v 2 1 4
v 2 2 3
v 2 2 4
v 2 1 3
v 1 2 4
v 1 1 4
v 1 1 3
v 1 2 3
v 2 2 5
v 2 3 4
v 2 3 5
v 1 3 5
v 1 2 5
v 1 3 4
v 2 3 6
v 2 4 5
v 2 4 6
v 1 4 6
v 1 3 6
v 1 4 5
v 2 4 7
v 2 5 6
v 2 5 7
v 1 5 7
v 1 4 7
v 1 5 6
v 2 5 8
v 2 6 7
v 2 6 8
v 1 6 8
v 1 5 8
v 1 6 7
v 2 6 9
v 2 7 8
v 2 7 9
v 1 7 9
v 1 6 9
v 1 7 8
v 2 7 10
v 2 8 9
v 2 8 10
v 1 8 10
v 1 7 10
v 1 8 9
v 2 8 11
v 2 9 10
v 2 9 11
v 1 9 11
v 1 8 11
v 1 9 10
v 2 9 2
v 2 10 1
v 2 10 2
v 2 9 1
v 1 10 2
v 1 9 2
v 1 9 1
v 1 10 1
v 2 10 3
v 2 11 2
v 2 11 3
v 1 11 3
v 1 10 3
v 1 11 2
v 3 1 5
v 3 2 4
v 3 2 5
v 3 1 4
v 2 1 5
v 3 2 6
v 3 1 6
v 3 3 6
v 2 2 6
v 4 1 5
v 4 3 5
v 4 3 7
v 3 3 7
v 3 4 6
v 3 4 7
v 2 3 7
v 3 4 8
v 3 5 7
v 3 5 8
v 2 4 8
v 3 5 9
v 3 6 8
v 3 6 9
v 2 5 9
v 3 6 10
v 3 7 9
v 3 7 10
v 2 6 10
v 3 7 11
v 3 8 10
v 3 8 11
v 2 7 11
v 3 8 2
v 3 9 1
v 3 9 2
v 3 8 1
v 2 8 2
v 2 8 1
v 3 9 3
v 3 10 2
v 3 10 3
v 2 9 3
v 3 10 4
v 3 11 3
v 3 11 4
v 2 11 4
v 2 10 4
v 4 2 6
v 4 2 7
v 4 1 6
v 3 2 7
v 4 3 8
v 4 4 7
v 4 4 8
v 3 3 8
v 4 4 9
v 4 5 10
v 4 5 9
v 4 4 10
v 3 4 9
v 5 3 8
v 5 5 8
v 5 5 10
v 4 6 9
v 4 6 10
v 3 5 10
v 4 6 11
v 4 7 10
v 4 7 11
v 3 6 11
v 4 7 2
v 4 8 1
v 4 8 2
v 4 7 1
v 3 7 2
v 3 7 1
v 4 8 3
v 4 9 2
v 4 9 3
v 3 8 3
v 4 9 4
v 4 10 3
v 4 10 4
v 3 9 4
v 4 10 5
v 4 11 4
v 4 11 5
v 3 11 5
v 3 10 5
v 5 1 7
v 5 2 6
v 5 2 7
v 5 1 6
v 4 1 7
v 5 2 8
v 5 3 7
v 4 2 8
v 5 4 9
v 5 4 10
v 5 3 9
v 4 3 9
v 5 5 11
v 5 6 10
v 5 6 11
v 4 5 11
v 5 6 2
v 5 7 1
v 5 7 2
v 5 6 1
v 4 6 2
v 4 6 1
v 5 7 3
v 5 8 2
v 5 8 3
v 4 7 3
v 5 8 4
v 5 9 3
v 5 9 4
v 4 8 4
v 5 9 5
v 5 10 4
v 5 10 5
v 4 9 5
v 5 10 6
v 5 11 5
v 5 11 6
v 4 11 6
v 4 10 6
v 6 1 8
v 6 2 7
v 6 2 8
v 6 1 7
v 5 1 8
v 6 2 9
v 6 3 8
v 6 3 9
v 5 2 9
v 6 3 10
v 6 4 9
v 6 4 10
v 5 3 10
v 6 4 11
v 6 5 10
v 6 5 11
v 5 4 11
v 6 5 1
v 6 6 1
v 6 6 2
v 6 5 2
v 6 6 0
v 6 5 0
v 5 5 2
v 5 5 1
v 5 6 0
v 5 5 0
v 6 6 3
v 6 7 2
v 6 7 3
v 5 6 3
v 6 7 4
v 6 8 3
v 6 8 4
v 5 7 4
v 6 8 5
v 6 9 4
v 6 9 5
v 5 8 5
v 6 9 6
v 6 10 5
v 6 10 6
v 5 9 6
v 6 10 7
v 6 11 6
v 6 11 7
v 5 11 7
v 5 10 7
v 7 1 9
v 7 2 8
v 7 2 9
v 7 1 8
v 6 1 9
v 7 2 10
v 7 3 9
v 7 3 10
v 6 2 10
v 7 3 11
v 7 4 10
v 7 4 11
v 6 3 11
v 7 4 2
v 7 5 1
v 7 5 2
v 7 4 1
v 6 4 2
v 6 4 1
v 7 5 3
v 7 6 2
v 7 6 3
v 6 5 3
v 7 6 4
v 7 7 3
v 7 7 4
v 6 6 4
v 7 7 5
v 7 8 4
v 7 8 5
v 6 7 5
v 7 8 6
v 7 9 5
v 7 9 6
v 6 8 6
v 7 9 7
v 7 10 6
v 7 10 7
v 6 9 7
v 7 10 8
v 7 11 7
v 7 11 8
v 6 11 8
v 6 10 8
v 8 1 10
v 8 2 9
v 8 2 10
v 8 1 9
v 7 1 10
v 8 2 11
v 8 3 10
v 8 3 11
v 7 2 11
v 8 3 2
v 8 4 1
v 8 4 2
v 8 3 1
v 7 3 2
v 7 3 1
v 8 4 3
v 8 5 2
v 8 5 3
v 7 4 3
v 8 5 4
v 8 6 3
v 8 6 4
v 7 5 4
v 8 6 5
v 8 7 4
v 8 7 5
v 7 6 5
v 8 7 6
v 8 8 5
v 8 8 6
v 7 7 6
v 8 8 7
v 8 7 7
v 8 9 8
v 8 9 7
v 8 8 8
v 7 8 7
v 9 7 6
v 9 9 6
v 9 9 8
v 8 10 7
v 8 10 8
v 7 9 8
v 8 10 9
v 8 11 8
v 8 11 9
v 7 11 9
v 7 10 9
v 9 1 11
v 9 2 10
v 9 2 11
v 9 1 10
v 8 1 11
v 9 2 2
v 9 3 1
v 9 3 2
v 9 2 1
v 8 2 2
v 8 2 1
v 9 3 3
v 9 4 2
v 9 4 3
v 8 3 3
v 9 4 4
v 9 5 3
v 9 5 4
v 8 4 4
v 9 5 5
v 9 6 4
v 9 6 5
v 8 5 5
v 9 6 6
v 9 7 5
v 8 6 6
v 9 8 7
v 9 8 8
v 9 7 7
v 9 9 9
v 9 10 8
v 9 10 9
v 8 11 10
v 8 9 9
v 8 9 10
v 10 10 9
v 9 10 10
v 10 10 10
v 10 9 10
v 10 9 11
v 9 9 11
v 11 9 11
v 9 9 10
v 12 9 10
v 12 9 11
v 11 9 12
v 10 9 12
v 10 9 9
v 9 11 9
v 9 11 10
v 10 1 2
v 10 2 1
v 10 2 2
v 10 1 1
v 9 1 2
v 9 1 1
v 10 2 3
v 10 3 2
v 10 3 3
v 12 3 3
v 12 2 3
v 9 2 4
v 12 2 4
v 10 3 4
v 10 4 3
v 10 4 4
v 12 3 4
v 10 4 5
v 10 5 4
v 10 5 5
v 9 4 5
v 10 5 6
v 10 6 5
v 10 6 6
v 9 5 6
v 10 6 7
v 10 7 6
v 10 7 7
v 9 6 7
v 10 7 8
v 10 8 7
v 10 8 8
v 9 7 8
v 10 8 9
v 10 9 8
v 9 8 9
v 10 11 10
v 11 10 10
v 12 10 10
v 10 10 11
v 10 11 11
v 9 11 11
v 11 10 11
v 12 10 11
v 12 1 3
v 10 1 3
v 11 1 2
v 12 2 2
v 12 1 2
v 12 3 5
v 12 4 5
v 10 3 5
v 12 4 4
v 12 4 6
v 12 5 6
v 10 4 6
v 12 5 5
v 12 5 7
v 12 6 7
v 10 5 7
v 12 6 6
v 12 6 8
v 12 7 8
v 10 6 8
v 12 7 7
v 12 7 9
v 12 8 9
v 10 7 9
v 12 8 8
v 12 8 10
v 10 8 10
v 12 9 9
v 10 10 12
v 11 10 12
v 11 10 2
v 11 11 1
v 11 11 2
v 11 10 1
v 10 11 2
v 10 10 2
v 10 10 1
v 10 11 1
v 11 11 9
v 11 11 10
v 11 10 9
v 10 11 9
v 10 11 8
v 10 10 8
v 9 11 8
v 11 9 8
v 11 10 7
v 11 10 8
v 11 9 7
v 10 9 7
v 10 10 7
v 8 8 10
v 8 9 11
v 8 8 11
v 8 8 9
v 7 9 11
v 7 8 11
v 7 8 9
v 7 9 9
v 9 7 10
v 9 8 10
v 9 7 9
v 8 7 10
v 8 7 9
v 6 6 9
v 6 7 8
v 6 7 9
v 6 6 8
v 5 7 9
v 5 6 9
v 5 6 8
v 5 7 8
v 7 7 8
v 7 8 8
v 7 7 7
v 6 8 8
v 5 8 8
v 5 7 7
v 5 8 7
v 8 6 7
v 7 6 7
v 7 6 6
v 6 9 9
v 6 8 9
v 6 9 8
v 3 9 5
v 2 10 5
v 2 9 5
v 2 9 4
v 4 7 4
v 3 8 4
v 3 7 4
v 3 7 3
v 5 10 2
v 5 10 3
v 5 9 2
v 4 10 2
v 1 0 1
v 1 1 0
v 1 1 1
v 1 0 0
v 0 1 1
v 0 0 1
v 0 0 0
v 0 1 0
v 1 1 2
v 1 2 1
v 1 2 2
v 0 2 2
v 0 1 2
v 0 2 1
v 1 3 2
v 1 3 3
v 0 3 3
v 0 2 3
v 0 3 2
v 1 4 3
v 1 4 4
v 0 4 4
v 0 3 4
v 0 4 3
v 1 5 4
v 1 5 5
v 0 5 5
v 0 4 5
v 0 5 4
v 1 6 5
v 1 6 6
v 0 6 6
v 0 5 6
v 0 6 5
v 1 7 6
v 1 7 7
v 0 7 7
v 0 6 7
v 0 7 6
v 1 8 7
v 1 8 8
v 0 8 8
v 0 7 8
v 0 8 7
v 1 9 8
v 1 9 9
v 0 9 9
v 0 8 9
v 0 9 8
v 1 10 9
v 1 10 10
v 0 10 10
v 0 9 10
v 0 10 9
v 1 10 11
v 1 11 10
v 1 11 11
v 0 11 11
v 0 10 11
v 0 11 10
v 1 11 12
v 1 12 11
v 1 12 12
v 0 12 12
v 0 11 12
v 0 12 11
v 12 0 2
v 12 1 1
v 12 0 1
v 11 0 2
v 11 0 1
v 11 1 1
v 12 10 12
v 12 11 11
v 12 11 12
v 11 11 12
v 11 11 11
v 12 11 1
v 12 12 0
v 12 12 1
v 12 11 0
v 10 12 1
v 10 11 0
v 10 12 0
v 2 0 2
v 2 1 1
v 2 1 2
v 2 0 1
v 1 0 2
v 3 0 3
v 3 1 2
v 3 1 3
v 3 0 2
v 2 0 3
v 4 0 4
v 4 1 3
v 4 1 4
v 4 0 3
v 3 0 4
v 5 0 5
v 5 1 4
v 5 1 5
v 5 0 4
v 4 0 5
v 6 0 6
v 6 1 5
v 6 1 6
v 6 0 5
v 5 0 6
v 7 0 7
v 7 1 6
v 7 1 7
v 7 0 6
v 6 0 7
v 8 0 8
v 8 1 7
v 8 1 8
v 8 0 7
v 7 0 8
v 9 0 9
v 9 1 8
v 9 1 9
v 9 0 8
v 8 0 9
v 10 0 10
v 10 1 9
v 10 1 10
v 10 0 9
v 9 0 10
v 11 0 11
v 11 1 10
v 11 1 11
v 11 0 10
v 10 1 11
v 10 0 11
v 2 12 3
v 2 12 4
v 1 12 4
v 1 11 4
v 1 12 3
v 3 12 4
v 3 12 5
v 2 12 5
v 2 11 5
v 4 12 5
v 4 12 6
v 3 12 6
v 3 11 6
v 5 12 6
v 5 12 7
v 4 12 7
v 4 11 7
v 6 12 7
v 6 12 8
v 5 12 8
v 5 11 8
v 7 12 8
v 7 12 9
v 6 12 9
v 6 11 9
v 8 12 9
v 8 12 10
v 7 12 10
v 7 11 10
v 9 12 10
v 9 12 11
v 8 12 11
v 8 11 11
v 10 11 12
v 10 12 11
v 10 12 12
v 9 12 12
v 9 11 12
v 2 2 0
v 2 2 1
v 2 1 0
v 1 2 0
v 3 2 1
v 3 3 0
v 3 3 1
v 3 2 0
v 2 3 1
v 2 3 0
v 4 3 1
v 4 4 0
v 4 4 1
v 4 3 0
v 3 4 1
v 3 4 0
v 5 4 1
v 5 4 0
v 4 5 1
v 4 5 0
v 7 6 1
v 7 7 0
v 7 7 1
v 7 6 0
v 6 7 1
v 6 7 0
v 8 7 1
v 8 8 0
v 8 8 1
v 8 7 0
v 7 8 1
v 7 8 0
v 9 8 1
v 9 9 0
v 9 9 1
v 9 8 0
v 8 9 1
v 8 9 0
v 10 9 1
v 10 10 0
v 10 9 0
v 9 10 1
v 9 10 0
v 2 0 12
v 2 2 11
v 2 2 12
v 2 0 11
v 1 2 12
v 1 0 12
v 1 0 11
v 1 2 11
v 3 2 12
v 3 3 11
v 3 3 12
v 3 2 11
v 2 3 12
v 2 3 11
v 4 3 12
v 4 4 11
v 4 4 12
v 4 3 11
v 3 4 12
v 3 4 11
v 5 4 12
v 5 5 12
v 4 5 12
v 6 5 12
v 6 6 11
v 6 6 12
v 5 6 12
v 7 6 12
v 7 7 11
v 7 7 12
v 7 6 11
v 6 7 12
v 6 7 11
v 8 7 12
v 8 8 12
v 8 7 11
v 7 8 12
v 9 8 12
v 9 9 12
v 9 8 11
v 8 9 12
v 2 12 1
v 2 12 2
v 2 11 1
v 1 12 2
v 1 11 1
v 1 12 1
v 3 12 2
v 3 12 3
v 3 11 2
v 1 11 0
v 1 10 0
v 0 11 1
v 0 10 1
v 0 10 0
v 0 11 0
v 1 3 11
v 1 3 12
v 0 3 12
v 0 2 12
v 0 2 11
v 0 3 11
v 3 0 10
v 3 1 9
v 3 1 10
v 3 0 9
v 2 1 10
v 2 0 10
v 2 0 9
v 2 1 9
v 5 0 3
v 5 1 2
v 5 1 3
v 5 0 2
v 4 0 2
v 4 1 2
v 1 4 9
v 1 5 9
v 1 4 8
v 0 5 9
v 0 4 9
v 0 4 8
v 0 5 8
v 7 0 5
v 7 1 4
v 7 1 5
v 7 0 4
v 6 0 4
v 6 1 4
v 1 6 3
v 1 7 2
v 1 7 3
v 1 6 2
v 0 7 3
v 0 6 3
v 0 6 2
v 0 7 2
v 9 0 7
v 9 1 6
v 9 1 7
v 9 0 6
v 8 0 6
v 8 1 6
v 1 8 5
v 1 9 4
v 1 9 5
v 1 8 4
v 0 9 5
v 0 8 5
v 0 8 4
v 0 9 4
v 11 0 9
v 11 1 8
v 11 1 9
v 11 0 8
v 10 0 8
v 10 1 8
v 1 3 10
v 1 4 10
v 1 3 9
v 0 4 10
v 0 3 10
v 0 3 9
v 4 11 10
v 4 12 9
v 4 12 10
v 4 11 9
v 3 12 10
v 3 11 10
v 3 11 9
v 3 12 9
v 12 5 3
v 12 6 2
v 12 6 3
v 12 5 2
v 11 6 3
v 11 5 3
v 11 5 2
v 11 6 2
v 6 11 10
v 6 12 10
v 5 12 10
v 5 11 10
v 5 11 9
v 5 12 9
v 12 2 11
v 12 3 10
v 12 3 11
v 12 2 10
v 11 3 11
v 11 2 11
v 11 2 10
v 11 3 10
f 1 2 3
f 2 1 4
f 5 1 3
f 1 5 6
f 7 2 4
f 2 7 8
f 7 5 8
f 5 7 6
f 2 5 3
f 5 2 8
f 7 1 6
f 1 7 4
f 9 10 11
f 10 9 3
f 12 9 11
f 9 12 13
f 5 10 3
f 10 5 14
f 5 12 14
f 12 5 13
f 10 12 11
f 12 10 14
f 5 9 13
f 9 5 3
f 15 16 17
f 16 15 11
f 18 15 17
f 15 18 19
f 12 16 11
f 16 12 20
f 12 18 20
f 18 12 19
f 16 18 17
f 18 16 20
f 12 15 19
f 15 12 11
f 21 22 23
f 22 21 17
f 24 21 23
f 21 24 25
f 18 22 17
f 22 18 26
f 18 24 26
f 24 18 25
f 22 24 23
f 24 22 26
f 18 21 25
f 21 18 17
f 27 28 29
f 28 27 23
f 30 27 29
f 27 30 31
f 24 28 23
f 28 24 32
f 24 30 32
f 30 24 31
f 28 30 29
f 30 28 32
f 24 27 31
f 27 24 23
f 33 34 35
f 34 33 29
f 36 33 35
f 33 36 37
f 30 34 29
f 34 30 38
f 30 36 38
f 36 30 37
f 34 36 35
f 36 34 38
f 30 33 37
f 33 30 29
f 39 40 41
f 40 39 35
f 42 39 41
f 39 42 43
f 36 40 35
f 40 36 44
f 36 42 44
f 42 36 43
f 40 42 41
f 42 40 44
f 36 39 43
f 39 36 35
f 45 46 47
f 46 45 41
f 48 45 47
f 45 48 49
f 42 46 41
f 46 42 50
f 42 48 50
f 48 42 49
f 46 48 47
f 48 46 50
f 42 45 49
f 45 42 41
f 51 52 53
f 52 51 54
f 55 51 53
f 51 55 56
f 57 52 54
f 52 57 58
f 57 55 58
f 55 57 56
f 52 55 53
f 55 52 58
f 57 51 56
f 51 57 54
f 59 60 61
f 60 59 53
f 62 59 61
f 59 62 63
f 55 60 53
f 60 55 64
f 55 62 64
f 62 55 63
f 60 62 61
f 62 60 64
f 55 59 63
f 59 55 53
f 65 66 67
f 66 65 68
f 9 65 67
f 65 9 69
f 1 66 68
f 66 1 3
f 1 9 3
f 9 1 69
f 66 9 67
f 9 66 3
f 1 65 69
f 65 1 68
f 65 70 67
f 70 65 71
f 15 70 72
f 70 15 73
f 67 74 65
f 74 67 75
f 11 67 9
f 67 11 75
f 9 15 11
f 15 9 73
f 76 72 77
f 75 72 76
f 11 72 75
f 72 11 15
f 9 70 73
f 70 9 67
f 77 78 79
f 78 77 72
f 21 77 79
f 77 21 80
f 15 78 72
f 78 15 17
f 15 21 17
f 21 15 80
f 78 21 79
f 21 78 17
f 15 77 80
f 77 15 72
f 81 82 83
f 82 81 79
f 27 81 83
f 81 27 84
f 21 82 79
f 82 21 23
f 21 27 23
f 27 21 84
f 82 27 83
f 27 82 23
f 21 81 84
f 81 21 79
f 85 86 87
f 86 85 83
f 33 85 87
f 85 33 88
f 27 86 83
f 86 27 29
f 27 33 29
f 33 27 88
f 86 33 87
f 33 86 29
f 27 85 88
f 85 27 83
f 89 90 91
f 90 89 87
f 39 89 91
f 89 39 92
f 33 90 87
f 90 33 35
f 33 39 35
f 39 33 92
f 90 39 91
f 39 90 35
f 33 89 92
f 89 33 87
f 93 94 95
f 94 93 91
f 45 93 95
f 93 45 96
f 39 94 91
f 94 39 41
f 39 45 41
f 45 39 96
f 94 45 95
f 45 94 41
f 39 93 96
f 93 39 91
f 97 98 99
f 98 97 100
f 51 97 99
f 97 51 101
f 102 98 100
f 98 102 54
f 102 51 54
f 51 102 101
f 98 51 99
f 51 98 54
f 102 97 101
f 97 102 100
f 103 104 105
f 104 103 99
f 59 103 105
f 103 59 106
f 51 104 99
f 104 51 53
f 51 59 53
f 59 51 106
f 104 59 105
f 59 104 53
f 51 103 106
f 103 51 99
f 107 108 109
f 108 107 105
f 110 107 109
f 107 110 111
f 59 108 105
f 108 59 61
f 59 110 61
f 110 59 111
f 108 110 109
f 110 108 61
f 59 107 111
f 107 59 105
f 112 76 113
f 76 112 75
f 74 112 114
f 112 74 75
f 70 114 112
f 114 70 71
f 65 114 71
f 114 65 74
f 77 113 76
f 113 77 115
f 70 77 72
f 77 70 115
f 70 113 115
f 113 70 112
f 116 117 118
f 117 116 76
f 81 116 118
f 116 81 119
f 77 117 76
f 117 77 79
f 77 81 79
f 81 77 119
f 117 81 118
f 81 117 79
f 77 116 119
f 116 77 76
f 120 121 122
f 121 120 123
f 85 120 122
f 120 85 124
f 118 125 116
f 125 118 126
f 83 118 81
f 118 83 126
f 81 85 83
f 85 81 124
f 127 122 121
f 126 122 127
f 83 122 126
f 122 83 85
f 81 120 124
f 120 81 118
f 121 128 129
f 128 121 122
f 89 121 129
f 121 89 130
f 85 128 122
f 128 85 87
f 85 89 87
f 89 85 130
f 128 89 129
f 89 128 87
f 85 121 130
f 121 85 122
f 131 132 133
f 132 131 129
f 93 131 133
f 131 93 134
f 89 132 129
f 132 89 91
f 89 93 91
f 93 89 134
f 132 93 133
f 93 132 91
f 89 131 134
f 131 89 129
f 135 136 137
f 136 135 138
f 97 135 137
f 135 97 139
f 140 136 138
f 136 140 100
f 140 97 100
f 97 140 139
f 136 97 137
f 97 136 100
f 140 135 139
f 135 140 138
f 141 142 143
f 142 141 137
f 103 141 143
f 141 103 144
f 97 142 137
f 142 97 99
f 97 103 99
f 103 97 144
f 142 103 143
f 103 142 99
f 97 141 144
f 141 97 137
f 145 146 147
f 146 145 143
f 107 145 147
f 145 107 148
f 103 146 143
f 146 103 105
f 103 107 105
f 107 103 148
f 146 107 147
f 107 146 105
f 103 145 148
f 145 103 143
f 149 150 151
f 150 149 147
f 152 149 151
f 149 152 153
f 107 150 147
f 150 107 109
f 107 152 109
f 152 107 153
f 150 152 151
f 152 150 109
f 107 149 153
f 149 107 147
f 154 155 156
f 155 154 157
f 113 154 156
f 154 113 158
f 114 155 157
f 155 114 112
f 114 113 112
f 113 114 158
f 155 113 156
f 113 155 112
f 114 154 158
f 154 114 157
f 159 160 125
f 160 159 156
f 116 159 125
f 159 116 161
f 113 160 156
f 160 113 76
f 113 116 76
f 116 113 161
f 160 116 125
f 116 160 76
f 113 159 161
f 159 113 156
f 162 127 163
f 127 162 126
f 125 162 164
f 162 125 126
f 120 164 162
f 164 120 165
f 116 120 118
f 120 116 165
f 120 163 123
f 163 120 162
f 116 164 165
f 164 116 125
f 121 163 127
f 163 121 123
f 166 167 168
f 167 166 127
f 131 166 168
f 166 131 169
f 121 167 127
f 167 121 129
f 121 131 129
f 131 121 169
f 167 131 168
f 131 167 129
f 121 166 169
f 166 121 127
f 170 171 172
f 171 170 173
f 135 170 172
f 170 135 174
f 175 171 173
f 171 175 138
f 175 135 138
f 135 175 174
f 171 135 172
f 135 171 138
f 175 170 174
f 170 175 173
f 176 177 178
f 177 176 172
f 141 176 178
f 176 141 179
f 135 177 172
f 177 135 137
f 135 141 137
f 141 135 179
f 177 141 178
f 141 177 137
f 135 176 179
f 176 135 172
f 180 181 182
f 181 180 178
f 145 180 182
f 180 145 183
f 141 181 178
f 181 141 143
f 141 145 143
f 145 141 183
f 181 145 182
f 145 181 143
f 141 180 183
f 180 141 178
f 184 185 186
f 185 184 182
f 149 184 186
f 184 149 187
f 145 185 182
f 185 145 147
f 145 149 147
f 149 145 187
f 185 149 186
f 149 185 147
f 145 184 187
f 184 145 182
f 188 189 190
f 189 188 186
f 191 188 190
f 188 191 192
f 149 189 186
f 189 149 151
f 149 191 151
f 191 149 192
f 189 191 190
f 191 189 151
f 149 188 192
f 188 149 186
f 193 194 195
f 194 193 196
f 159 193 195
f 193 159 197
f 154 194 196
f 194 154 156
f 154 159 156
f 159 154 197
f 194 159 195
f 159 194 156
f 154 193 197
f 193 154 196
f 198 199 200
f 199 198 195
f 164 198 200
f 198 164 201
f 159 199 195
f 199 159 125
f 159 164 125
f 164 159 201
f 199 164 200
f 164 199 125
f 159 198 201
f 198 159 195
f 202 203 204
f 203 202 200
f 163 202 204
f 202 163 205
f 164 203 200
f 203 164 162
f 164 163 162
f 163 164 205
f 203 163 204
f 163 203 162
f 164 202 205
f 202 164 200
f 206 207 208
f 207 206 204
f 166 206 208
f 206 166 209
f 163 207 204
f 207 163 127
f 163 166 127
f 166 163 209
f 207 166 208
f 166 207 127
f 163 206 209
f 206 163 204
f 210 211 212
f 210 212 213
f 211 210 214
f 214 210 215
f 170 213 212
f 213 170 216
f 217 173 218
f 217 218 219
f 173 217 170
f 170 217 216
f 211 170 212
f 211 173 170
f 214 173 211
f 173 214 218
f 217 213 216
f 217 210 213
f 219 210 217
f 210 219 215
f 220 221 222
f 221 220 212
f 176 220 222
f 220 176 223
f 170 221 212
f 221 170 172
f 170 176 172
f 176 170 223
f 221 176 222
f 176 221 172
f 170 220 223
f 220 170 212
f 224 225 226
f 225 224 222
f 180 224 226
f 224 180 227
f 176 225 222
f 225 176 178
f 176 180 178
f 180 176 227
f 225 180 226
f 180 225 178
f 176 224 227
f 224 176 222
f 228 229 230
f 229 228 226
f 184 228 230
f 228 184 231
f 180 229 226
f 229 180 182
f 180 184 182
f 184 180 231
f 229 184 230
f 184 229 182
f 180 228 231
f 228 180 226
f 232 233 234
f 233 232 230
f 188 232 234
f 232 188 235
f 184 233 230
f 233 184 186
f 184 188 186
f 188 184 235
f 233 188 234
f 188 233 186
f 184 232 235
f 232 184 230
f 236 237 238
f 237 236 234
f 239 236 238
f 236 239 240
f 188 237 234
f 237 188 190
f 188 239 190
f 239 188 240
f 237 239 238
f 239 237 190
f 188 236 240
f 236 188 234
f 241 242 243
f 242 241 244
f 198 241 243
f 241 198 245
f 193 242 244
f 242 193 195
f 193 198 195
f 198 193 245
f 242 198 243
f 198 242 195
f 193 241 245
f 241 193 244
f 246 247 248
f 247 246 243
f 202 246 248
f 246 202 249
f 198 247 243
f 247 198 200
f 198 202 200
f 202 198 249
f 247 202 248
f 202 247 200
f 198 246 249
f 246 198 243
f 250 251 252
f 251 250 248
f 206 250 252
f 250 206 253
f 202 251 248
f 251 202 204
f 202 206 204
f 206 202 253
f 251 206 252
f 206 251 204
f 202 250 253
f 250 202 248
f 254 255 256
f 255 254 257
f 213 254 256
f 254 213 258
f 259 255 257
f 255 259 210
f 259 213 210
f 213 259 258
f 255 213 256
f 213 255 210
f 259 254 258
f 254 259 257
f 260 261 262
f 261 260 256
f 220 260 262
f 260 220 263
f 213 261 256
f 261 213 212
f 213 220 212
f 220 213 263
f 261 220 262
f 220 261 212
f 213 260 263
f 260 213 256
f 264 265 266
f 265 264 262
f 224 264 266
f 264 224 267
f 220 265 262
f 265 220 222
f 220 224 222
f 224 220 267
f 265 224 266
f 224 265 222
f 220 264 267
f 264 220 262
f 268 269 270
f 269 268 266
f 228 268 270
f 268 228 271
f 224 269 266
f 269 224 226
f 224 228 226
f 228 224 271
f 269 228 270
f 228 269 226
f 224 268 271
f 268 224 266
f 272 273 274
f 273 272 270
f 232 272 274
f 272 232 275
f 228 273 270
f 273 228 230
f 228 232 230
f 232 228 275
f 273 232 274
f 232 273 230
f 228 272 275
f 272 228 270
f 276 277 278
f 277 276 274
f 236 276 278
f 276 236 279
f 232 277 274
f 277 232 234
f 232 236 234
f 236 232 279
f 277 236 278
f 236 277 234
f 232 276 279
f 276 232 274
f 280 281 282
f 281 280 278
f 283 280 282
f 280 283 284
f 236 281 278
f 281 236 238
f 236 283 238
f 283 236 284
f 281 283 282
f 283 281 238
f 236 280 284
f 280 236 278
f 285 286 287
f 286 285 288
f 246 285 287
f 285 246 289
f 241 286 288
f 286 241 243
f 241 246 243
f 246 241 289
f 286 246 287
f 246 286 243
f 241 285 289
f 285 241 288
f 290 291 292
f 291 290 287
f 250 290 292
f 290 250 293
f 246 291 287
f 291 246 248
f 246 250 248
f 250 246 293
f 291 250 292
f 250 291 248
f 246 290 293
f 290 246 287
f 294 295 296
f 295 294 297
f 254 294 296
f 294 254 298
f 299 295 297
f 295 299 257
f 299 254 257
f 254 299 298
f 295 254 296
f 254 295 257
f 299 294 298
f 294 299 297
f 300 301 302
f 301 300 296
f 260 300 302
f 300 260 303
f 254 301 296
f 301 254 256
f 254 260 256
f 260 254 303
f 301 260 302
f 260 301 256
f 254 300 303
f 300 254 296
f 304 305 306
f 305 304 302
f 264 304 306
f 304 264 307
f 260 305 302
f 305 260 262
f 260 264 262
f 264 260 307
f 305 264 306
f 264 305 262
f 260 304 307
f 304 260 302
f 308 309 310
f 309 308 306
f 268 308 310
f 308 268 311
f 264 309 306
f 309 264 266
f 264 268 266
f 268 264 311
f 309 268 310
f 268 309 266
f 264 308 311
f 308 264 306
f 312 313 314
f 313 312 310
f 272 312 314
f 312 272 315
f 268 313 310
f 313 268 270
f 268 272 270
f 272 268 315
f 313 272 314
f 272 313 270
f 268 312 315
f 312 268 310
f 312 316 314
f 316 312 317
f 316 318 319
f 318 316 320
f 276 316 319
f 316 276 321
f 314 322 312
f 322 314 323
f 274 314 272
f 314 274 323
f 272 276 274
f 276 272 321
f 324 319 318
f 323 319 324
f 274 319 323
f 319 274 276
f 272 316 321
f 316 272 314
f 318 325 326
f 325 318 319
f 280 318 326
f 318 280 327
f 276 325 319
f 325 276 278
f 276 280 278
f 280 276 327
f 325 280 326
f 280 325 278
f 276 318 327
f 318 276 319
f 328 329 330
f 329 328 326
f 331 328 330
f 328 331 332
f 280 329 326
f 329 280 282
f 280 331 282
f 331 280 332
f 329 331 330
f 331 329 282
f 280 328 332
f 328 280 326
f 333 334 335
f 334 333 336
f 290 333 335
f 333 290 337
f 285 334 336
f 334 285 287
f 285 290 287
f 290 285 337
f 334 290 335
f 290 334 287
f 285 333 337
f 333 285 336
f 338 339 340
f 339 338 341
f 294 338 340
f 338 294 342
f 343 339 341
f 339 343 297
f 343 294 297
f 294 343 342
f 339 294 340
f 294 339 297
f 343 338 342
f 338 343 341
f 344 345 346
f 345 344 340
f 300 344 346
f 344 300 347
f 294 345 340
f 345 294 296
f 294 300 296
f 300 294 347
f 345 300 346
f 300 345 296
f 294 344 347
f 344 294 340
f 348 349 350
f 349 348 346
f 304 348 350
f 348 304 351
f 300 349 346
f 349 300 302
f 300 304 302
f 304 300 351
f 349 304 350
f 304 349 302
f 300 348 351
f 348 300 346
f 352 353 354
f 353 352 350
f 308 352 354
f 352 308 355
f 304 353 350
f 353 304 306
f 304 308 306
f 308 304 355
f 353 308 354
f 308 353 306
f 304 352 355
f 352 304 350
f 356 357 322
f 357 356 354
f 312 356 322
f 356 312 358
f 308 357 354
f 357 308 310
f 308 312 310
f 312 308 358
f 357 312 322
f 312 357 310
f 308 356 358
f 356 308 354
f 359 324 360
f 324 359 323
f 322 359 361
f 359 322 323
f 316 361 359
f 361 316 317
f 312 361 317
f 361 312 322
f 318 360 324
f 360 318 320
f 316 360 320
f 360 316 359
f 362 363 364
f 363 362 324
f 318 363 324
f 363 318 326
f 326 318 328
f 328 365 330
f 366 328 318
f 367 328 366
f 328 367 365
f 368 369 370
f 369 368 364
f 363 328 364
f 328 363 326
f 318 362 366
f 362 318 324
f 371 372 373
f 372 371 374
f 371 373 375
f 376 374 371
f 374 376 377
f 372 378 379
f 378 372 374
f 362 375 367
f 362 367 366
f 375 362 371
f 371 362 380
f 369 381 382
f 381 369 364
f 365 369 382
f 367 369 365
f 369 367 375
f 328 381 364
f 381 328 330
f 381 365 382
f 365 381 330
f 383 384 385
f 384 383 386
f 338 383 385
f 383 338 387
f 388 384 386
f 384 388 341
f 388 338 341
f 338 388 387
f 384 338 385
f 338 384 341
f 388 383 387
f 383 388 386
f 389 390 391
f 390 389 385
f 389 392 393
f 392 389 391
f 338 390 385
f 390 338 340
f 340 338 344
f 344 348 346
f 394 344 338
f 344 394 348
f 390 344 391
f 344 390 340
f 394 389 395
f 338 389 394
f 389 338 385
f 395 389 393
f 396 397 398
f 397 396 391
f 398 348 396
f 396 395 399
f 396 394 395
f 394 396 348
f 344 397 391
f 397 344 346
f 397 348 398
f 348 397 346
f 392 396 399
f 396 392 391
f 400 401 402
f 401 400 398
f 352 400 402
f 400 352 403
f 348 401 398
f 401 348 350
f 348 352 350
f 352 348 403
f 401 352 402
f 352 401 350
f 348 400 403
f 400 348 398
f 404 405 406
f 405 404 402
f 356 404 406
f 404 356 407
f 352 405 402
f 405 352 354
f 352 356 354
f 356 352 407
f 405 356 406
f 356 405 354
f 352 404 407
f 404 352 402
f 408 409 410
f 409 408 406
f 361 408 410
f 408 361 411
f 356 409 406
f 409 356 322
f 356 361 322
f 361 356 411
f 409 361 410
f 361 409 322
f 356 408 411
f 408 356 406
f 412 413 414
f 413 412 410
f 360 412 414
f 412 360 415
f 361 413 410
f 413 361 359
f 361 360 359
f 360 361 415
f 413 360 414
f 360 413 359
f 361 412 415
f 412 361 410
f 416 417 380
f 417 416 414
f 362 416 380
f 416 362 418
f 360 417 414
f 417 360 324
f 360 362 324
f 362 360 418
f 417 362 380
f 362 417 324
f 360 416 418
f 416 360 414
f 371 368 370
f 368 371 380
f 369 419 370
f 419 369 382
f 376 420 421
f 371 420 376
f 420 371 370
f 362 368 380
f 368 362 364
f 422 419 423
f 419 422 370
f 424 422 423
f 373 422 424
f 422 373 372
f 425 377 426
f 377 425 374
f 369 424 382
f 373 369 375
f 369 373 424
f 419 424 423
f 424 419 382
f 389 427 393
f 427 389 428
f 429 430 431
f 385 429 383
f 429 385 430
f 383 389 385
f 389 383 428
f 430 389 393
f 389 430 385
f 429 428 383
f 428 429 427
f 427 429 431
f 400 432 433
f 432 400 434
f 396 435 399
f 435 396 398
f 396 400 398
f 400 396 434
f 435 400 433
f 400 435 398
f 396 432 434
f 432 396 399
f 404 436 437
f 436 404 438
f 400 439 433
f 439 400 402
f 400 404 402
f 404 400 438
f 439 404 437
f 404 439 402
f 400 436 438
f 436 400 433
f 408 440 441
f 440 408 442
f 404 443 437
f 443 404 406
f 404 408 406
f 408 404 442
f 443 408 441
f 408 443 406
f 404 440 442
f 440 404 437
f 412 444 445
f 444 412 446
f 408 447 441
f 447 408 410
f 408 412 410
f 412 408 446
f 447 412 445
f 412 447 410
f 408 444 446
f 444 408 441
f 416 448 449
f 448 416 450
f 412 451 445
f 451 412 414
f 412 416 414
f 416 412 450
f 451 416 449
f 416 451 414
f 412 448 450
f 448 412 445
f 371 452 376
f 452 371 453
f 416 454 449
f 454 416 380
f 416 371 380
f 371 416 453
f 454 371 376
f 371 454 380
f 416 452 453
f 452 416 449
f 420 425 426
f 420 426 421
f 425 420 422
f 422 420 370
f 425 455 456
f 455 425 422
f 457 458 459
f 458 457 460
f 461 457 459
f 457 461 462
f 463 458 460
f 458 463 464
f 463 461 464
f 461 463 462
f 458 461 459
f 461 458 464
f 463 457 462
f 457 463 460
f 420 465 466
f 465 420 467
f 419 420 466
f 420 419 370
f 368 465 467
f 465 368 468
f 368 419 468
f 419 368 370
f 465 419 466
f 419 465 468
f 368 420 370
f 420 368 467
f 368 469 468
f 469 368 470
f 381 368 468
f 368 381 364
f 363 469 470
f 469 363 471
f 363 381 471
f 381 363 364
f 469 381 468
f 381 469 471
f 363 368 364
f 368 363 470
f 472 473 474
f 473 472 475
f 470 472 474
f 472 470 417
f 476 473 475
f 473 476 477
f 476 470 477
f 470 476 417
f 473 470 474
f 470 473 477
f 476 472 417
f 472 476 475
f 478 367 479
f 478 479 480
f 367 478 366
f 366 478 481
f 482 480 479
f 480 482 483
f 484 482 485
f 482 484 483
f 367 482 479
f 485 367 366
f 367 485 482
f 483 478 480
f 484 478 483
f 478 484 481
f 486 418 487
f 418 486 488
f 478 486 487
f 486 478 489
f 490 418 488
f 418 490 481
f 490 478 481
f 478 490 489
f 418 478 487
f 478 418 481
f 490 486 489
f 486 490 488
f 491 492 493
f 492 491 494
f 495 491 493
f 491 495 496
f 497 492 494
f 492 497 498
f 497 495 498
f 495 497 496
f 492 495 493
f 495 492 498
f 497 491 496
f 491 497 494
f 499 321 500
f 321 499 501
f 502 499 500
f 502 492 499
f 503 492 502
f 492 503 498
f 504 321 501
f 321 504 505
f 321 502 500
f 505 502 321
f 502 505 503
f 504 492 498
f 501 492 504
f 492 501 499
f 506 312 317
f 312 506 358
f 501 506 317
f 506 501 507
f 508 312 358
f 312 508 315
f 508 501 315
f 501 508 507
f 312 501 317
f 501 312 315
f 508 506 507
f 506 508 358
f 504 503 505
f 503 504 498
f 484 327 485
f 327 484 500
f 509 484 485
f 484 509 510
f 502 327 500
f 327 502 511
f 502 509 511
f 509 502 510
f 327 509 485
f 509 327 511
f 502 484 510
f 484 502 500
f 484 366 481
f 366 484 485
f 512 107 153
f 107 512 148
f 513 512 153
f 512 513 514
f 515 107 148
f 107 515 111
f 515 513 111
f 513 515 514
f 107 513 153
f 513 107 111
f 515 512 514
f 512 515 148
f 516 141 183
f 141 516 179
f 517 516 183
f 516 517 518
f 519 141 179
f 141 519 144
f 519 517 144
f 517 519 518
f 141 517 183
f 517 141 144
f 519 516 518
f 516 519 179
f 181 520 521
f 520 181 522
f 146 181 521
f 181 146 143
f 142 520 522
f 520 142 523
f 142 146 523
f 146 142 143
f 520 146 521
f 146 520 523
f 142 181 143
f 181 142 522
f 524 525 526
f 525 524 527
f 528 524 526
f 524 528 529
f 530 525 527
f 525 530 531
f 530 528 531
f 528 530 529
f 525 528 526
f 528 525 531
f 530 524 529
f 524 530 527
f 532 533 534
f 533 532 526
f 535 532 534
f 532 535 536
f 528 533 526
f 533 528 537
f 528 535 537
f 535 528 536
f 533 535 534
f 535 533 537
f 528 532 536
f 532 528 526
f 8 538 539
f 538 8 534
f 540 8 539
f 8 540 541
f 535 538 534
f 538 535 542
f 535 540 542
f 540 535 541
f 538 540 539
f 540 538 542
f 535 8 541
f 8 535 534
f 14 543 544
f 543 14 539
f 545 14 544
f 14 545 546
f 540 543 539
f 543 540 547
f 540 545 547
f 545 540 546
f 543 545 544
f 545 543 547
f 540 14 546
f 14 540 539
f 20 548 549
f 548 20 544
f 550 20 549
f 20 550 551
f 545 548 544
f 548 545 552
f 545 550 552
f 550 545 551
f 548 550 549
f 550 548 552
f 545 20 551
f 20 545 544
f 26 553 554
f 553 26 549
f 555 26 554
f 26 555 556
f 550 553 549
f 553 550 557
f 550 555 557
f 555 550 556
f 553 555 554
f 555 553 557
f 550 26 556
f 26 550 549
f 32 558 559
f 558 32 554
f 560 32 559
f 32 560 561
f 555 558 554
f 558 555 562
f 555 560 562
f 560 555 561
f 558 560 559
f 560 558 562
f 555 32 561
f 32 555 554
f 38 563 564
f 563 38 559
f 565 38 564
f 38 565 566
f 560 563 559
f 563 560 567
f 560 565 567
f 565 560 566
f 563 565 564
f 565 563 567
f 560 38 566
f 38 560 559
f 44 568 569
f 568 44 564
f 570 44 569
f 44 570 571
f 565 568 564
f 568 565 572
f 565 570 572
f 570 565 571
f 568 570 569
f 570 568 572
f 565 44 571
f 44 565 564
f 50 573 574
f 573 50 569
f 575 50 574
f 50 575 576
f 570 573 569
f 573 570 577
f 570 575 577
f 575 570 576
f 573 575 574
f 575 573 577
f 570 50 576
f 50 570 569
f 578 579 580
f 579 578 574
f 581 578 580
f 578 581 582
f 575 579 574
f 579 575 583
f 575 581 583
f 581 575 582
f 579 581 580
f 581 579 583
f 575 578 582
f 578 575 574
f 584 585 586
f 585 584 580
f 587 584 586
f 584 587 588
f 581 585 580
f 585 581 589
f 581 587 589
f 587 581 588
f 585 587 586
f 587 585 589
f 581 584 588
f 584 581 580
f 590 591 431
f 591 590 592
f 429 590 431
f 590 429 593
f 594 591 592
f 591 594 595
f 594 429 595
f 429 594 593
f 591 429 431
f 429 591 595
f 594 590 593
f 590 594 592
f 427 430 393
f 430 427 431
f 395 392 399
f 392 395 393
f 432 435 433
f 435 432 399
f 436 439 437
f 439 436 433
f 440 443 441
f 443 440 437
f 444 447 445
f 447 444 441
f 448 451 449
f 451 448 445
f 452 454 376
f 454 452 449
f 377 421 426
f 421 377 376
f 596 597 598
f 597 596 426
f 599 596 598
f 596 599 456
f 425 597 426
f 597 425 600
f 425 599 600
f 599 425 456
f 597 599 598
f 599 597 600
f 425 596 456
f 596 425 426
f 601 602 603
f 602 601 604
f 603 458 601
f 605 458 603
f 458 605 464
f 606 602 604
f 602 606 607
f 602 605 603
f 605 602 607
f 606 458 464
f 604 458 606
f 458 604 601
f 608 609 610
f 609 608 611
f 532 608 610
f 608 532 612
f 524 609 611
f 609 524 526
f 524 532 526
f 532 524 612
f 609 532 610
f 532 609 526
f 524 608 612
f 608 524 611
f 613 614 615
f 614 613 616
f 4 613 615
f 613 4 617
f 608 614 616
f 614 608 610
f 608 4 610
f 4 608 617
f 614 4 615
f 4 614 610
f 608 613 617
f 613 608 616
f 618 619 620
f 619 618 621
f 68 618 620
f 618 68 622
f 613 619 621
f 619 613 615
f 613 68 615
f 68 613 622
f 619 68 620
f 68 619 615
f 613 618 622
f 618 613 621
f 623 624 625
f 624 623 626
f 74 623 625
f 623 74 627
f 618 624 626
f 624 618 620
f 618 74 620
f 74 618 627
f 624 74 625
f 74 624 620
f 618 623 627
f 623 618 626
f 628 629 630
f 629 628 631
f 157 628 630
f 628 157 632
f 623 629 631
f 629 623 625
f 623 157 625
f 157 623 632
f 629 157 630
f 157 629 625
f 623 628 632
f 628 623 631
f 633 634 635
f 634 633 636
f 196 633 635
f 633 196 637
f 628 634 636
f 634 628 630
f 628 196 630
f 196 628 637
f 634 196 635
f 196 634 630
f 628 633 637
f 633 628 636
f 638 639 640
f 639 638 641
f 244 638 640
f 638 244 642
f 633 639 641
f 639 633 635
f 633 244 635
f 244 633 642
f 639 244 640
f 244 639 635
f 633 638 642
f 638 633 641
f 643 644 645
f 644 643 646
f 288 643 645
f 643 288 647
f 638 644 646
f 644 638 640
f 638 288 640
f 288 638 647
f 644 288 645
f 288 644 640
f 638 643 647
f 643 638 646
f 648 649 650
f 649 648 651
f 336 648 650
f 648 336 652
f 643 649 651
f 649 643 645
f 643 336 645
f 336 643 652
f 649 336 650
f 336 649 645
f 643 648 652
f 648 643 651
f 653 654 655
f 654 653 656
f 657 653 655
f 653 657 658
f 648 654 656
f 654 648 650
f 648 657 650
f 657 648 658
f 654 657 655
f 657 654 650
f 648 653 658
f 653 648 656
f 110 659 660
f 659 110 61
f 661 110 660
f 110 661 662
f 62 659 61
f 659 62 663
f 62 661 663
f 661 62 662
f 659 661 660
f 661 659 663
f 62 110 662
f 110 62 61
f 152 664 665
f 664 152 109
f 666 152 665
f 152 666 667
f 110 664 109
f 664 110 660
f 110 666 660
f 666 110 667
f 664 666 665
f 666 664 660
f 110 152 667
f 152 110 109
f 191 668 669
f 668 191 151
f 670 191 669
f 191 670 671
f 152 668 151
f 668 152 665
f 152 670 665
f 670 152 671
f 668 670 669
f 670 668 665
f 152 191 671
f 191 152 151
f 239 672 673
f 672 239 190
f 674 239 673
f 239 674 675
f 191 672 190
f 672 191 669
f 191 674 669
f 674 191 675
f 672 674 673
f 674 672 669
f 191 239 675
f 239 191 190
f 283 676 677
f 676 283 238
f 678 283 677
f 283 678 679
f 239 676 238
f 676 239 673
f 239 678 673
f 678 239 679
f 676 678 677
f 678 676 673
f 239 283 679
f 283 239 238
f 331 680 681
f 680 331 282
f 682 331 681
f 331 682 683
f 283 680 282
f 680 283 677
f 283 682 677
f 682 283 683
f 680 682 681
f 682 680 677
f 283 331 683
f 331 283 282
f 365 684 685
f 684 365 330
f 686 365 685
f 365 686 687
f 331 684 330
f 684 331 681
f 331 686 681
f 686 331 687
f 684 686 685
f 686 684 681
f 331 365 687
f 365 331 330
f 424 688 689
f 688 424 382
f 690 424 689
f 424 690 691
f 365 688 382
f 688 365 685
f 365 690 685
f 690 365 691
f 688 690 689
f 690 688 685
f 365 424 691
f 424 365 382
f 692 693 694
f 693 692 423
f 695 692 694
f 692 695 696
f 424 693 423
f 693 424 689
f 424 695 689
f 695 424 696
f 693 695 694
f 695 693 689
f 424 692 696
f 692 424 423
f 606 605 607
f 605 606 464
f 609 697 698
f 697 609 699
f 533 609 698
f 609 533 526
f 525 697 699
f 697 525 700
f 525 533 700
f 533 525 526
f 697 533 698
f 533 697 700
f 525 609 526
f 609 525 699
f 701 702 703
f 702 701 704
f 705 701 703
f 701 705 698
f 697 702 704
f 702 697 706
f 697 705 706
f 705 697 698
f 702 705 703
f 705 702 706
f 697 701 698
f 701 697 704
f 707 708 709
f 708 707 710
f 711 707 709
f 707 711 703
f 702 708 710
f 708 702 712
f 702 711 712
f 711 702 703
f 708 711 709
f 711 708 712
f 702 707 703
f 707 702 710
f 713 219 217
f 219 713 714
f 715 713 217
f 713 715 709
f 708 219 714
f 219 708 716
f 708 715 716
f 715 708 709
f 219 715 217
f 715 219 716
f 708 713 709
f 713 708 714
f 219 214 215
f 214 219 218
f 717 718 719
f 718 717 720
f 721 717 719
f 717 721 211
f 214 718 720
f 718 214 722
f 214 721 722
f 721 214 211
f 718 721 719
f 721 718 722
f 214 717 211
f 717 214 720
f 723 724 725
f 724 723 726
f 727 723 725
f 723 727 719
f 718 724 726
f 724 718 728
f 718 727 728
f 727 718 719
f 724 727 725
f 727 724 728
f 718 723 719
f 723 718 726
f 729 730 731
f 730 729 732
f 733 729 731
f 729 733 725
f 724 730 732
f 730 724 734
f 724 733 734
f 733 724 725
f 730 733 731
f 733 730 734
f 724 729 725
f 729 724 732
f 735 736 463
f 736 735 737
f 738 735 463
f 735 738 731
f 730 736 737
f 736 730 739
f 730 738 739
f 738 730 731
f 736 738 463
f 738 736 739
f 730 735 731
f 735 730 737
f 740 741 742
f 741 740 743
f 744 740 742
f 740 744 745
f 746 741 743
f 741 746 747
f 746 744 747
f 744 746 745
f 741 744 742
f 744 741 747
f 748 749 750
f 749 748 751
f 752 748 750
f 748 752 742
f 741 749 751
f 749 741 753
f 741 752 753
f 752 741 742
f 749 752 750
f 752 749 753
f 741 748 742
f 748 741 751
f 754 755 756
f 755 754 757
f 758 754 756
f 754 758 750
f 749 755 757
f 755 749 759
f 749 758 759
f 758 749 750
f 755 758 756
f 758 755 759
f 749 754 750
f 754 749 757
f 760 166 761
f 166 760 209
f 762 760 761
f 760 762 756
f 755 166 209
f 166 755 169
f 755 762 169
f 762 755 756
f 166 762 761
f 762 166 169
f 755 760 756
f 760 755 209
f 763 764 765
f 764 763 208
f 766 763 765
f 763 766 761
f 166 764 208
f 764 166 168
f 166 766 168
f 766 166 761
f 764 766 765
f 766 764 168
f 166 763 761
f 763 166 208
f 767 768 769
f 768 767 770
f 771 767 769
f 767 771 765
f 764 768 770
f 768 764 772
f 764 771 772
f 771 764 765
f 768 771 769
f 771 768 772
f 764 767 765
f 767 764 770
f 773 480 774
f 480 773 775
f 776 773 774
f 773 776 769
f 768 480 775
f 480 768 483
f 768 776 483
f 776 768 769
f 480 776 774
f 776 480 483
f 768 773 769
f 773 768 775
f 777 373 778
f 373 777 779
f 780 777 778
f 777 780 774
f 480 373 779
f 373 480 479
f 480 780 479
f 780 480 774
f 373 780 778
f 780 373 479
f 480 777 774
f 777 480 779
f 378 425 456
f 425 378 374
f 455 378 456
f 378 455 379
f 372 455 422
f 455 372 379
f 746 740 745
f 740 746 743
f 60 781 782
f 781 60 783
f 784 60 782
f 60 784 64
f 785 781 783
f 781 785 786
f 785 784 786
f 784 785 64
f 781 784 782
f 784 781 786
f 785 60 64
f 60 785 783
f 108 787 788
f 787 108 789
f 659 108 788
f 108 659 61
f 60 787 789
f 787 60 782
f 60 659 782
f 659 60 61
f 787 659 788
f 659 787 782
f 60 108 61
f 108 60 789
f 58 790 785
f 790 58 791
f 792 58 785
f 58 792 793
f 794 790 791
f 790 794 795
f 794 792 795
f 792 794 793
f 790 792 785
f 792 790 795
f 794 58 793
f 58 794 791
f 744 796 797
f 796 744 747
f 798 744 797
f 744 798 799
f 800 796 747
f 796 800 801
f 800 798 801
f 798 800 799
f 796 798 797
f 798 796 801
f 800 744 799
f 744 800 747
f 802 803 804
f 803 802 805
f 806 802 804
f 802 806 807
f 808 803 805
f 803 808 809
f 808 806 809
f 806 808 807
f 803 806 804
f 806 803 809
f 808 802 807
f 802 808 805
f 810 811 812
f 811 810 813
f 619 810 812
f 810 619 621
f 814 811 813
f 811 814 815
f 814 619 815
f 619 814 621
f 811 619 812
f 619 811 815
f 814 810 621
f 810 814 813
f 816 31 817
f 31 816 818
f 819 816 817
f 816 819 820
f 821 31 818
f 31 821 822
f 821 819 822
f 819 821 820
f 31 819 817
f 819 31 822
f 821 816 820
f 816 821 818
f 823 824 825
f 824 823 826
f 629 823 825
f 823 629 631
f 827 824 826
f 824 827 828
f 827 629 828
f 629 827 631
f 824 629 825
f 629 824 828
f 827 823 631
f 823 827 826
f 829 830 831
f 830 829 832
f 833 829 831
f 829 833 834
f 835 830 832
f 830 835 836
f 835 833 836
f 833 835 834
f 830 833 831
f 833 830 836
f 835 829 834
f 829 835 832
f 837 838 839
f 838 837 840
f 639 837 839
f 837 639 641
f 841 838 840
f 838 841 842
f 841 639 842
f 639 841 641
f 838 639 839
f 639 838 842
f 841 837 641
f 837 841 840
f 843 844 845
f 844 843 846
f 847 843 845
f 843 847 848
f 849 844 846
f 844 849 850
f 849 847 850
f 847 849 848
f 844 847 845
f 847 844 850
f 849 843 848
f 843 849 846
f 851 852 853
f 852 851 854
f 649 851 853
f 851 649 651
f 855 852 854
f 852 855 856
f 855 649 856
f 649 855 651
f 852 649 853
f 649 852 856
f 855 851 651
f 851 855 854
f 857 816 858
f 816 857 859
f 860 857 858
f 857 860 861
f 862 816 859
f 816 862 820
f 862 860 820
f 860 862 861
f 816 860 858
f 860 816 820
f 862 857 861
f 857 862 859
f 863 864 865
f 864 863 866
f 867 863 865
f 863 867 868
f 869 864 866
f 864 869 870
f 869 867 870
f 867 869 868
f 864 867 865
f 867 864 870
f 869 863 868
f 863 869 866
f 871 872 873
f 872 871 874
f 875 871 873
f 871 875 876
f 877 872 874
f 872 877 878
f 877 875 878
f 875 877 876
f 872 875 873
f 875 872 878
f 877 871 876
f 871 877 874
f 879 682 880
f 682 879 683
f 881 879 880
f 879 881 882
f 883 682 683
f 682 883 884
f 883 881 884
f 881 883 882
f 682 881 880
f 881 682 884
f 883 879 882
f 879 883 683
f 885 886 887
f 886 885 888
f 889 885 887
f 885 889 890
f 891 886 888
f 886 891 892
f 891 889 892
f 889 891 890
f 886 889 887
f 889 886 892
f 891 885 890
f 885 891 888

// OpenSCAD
union() {
    translate([1, 1, 3]) cube([1, 1, 1]);
    translate([1, 2, 4]) cube([1, 1, 1]);
    translate([1, 3, 5]) cube([1, 1, 1]);
    translate([1, 4, 6]) cube([1, 1, 1]);
    translate([1, 5, 7]) cube([1, 1, 1]);
    translate([1, 6, 8]) cube([1, 1, 1]);
    translate([1, 7, 9]) cube([1, 1, 1]);
    translate([1, 8, 10]) cube([1, 1, 1]);
    translate([1, 9, 1]) cube([1, 1, 1]);
    translate([1, 10, 2]) cube([1, 1, 1]);
    translate([2, 1, 4]) cube([1, 1, 1]);
    translate([2, 2, 5]) cube([1, 1, 1]);
    translate([2, 3, 6]) cube([1, 1, 1]);
    translate([2, 4, 7]) cube([1, 1, 1]);
    translate([2, 5, 8]) cube([1, 1, 1]);
    translate([2, 6, 9]) cube([1, 1, 1]);
    translate([2, 7, 10]) cube([1, 1, 1]);
    translate([2, 8, 1]) cube([1, 1, 1]);
    translate([2, 9, 2]) cube([1, 1, 1]);
    translate([2, 10, 3]) cube([1, 1, 1]);
    translate([3, 1, 5]) cube([1, 1, 1]);
    translate([3, 2, 6]) cube([1, 1, 1]);
    translate([3, 3, 7]) cube([1, 1, 1]);
    translate([3, 4, 8]) cube([1, 1, 1]);
    translate([3, 5, 9]) cube([1, 1, 1]);
    translate([3, 6, 10]) cube([1, 1, 1]);
    translate([3, 7, 1]) cube([1, 1, 1]);
    translate([3, 8, 2]) cube([1, 1, 1]);
    translate([3, 9, 3]) cube([1, 1, 1]);
    translate([3, 10, 4]) cube([1, 1, 1]);
    translate([4, 1, 6]) cube([1, 1, 1]);
    translate([4, 2, 7]) cube([1, 1, 1]);
    translate([4, 3, 8]) cube([1, 1, 1]);
    translate([4, 4, 9]) cube([1, 1, 1]);
    translate([4, 5, 10]) cube([1, 1, 1]);
    translate([4, 6, 1]) cube([1, 1, 1]);
    translate([4, 7, 2]) cube([1, 1, 1]);
    translate([4, 8, 3]) cube([1, 1, 1]);
    translate([4, 9, 4]) cube([1, 1, 1]);
    translate([4, 10, 5]) cube([1, 1, 1]);
    translate([5, 1, 7]) cube([1, 1, 1]);
    translate([5, 2, 8]) cube([1, 1, 1]);
    translate([5, 3, 9]) cube([1, 1, 1]);
    translate([5, 4, 10]) cube([1, 1, 1]);
    translate([5, 5, 1]) cube([1, 1, 1]);
    translate([5, 6, 2]) cube([1, 1, 1]);
    translate([5, 7, 3]) cube([1, 1, 1]);
    translate([5, 8, 4]) cube([1, 1, 1]);
    translate([5, 9, 5]) cube([1, 1, 1]);
    translate([5, 10, 6]) cube([1, 1, 1]);
    translate([6, 1, 8]) cube([1, 1, 1]);
    translate([6, 2, 9]) cube([1, 1, 1]);
    translate([6, 3, 10]) cube([1, 1, 1]);
    translate([6, 4, 1]) cube([1, 1, 1]);
    translate([6, 5, 2]) cube([1, 1, 1]);
    translate([6, 6, 3]) cube([1, 1, 1]);
    translate([6, 7, 4]) cube([1, 1, 1]);
    translate([6, 8, 5]) cube([1, 1, 1]);
    translate([6, 9, 6]) cube([1, 1, 1]);
    translate([6, 10, 7]) cube([1, 1, 1]);
    translate([7, 1, 9]) cube([1, 1, 1]);
    translate([7, 2, 10]) cube([1, 1, 1]);
    translate([7, 3, 1]) cube([1, 1, 1]);
    translate([7, 4, 2]) cube([1, 1, 1]);
    translate([7, 5, 3]) cube([1, 1, 1]);
    translate([7, 6, 4]) cube([1, 1, 1]);
    translate([7, 7, 5]) cube([1, 1, 1]);
    translate([7, 8, 6]) cube([1, 1, 1]);
    translate([7, 9, 7]) cube([1, 1, 1]);
    translate([7, 10, 8]) cube([1, 1, 1]);
    translate([8, 1, 10]) cube([1, 1, 1]);
    translate([8, 2, 1]) cube([1, 1, 1]);
    translate([8, 3, 2]) cube([1, 1, 1]);
    translate([8, 4, 3]) cube([1, 1, 1]);
    translate([8, 5, 4]) cube([1, 1, 1]);
    translate([8, 6, 5]) cube([1, 1, 1]);
    translate([8, 7, 6]) cube([1, 1, 1]);
    translate([8, 8, 7]) cube([1, 1, 1]);
    translate([8, 9, 8]) cube([1, 1, 1]);
    translate([8, 10, 9]) cube([1, 1, 1]);
    translate([9, 1, 1]) cube([1, 1, 1]);
    translate([9, 2, 2]) cube([1, 1, 1]);
    translate([9, 3, 3]) cube([1, 1, 1]);
    translate([9, 4, 4]) cube([1, 1, 1]);
    translate([9, 5, 5]) cube([1, 1, 1]);
    translate([9, 6, 6]) cube([1, 1, 1]);
    translate([9, 7, 7]) cube([1, 1, 1]);
    translate([9, 8, 8]) cube([1, 1, 1]);
    translate([9, 9, 9]) cube([1, 1, 1]);
    translate([9, 10, 10]) cube([1, 1, 1]);
    translate([10, 1, 2]) cube([1, 1, 1]);
    translate([10, 2, 3]) cube([1, 1, 1]);
    translate([10, 3, 4]) cube([1, 1, 1]);
    translate([10, 4, 5]) cube([1, 1, 1]);
    translate([10, 5, 6]) cube([1, 1, 1]);
    translate([10, 6, 7]) cube([1, 1, 1]);
    translate([10, 7, 8]) cube([1, 1, 1]);
    translate([10, 8, 9]) cube([1, 1, 1]);
    translate([10, 9, 10]) cube([1, 1, 1]);
    translate([10, 10, 1]) cube([1, 1, 1]);
    translate([9, 9, 10]) cube([1, 1, 1]);
    translate([10, 10, 9]) cube([1, 1, 1]);
    translate([9, 10, 8]) cube([1, 1, 1]);
    translate([10, 9, 7]) cube([1, 1, 1]);
    translate([7, 8, 10]) cube([1, 1, 1]);
    translate([8, 7, 9]) cube([1, 1, 1]);
    translate([5, 6, 8]) cube([1, 1, 1]);
    translate([6, 7, 7]) cube([1, 1, 1]);
    translate([7, 6, 6]) cube([1, 1, 1]);
    translate([8, 8, 6]) cube([1, 1, 1]);
    translate([3, 2, 5]) cube([1, 1, 1]);
    translate([4, 4, 8]) cube([1, 1, 1]);
    translate([5, 7, 7]) cube([1, 1, 1]);
    translate([6, 8, 8]) cube([1, 1, 1]);
    translate([7, 8, 9]) cube([1, 1, 1]);
    translate([8, 9, 9]) cube([1, 1, 1]);
    translate([2, 9, 4]) cube([1, 1, 1]);
    translate([3, 7, 3]) cube([1, 1, 1]);
    translate([9, 2, 3]) cube([1, 1, 1]);
    translate([4, 9, 2]) cube([1, 1, 1]);
    translate([0, 0, 0]) cube([1, 1, 1]);
    translate([0, 1, 1]) cube([1, 1, 1]);
    translate([0, 2, 2]) cube([1, 1, 1]);
    translate([0, 3, 3]) cube([1, 1, 1]);
    translate([0, 4, 4]) cube([1, 1, 1]);
    translate([0, 5, 5]) cube([1, 1, 1]);
    translate([0, 6, 6]) cube([1, 1, 1]);
    translate([0, 7, 7]) cube([1, 1, 1]);
    translate([0, 8, 8]) cube([1, 1, 1]);
    translate([0, 9, 9]) cube([1, 1, 1]);
    translate([0, 10, 10]) cube([1, 1, 1]);
    translate([0, 11, 11]) cube([1, 1, 1]);
    translate([11, 0, 1]) cube([1, 1, 1]);
    translate([11, 1, 2]) cube([1, 1, 1]);
    translate([11, 2, 3]) cube([1, 1, 1]);
    translate([11, 3, 4]) cube([1, 1, 1]);
    translate([11, 4, 5]) cube([1, 1, 1]);
    translate([11, 5, 6]) cube([1, 1, 1]);
    translate([11, 6, 7]) cube([1, 1, 1]);
    translate([11, 7, 8]) cube([1, 1, 1]);
    translate([11, 8, 9]) cube([1, 1, 1]);
    translate([11, 9, 10]) cube([1, 1, 1]);
    translate([11, 10, 11]) cube([1, 1, 1]);
    translate([11, 11, 0]) cube([1, 1, 1]);
    translate([1, 0, 1]) cube([1, 1, 1]);
    translate([2, 0, 2]) cube([1, 1, 1]);
    translate([3, 0, 3]) cube([1, 1, 1]);
    translate([4, 0, 4]) cube([1, 1, 1]);
    translate([5, 0, 5]) cube([1, 1, 1]);
    translate([6, 0, 6]) cube([1, 1, 1]);
    translate([7, 0, 7]) cube([1, 1, 1]);
    translate([8, 0, 8]) cube([1, 1, 1]);
    translate([9, 0, 9]) cube([1, 1, 1]);
    translate([10, 0, 10]) cube([1, 1, 1]);
    translate([1, 11, 3]) cube([1, 1, 1]);
    translate([2, 11, 4]) cube([1, 1, 1]);
    translate([3, 11, 5]) cube([1, 1, 1]);
    translate([4, 11, 6]) cube([1, 1, 1]);
    translate([5, 11, 7]) cube([1, 1, 1]);
    translate([6, 11, 8]) cube([1, 1, 1]);
    translate([7, 11, 9]) cube([1, 1, 1]);
    translate([8, 11, 10]) cube([1, 1, 1]);
    translate([9, 11, 11]) cube([1, 1, 1]);
    translate([10, 11, 0]) cube([1, 1, 1]);
    translate([1, 1, 0]) cube([1, 1, 1]);
    translate([2, 2, 0]) cube([1, 1, 1]);
    translate([3, 3, 0]) cube([1, 1, 1]);
    translate([4, 4, 0]) cube([1, 1, 1]);
    translate([5, 5, 0]) cube([1, 1, 1]);
    translate([6, 6, 0]) cube([1, 1, 1]);
    translate([7, 7, 0]) cube([1, 1, 1]);
    translate([8, 8, 0]) cube([1, 1, 1]);
    translate([9, 9, 0]) cube([1, 1, 1]);
    translate([1, 1, 11]) cube([1, 1, 1]);
    translate([2, 2, 11]) cube([1, 1, 1]);
    translate([3, 3, 11]) cube([1, 1, 1]);
    translate([4, 4, 11]) cube([1, 1, 1]);
    translate([5, 5, 11]) cube([1, 1, 1]);
    translate([6, 6, 11]) cube([1, 1, 1]);
    translate([7, 7, 11]) cube([1, 1, 1]);
    translate([8, 8, 11]) cube([1, 1, 1]);
    translate([10, 9, 11]) cube([1, 1, 1]);
    translate([1, 0, 11]) cube([1, 1, 1]);
    translate([1, 11, 1]) cube([1, 1, 1]);
    translate([2, 11, 2]) cube([1, 1, 1]);
    translate([0, 10, 0]) cube([1, 1, 1]);
    translate([0, 2, 11]) cube([1, 1, 1]);
    translate([2, 0, 9]) cube([1, 1, 1]);
    translate([4, 0, 2]) cube([1, 1, 1]);
    translate([0, 4, 8]) cube([1, 1, 1]);
    translate([6, 0, 4]) cube([1, 1, 1]);
    translate([0, 6, 2]) cube([1, 1, 1]);
    translate([8, 0, 6]) cube([1, 1, 1]);
    translate([0, 8, 4]) cube([1, 1, 1]);
    translate([10, 0, 8]) cube([1, 1, 1]);
    translate([0, 3, 9]) cube([1, 1, 1]);
    translate([3, 11, 9]) cube([1, 1, 1]);
    translate([11, 5, 2]) cube([1, 1, 1]);
    translate([5, 11, 9]) cube([1, 1, 1]);
    translate([11, 2, 10]) cube([1, 1, 1]);
}
